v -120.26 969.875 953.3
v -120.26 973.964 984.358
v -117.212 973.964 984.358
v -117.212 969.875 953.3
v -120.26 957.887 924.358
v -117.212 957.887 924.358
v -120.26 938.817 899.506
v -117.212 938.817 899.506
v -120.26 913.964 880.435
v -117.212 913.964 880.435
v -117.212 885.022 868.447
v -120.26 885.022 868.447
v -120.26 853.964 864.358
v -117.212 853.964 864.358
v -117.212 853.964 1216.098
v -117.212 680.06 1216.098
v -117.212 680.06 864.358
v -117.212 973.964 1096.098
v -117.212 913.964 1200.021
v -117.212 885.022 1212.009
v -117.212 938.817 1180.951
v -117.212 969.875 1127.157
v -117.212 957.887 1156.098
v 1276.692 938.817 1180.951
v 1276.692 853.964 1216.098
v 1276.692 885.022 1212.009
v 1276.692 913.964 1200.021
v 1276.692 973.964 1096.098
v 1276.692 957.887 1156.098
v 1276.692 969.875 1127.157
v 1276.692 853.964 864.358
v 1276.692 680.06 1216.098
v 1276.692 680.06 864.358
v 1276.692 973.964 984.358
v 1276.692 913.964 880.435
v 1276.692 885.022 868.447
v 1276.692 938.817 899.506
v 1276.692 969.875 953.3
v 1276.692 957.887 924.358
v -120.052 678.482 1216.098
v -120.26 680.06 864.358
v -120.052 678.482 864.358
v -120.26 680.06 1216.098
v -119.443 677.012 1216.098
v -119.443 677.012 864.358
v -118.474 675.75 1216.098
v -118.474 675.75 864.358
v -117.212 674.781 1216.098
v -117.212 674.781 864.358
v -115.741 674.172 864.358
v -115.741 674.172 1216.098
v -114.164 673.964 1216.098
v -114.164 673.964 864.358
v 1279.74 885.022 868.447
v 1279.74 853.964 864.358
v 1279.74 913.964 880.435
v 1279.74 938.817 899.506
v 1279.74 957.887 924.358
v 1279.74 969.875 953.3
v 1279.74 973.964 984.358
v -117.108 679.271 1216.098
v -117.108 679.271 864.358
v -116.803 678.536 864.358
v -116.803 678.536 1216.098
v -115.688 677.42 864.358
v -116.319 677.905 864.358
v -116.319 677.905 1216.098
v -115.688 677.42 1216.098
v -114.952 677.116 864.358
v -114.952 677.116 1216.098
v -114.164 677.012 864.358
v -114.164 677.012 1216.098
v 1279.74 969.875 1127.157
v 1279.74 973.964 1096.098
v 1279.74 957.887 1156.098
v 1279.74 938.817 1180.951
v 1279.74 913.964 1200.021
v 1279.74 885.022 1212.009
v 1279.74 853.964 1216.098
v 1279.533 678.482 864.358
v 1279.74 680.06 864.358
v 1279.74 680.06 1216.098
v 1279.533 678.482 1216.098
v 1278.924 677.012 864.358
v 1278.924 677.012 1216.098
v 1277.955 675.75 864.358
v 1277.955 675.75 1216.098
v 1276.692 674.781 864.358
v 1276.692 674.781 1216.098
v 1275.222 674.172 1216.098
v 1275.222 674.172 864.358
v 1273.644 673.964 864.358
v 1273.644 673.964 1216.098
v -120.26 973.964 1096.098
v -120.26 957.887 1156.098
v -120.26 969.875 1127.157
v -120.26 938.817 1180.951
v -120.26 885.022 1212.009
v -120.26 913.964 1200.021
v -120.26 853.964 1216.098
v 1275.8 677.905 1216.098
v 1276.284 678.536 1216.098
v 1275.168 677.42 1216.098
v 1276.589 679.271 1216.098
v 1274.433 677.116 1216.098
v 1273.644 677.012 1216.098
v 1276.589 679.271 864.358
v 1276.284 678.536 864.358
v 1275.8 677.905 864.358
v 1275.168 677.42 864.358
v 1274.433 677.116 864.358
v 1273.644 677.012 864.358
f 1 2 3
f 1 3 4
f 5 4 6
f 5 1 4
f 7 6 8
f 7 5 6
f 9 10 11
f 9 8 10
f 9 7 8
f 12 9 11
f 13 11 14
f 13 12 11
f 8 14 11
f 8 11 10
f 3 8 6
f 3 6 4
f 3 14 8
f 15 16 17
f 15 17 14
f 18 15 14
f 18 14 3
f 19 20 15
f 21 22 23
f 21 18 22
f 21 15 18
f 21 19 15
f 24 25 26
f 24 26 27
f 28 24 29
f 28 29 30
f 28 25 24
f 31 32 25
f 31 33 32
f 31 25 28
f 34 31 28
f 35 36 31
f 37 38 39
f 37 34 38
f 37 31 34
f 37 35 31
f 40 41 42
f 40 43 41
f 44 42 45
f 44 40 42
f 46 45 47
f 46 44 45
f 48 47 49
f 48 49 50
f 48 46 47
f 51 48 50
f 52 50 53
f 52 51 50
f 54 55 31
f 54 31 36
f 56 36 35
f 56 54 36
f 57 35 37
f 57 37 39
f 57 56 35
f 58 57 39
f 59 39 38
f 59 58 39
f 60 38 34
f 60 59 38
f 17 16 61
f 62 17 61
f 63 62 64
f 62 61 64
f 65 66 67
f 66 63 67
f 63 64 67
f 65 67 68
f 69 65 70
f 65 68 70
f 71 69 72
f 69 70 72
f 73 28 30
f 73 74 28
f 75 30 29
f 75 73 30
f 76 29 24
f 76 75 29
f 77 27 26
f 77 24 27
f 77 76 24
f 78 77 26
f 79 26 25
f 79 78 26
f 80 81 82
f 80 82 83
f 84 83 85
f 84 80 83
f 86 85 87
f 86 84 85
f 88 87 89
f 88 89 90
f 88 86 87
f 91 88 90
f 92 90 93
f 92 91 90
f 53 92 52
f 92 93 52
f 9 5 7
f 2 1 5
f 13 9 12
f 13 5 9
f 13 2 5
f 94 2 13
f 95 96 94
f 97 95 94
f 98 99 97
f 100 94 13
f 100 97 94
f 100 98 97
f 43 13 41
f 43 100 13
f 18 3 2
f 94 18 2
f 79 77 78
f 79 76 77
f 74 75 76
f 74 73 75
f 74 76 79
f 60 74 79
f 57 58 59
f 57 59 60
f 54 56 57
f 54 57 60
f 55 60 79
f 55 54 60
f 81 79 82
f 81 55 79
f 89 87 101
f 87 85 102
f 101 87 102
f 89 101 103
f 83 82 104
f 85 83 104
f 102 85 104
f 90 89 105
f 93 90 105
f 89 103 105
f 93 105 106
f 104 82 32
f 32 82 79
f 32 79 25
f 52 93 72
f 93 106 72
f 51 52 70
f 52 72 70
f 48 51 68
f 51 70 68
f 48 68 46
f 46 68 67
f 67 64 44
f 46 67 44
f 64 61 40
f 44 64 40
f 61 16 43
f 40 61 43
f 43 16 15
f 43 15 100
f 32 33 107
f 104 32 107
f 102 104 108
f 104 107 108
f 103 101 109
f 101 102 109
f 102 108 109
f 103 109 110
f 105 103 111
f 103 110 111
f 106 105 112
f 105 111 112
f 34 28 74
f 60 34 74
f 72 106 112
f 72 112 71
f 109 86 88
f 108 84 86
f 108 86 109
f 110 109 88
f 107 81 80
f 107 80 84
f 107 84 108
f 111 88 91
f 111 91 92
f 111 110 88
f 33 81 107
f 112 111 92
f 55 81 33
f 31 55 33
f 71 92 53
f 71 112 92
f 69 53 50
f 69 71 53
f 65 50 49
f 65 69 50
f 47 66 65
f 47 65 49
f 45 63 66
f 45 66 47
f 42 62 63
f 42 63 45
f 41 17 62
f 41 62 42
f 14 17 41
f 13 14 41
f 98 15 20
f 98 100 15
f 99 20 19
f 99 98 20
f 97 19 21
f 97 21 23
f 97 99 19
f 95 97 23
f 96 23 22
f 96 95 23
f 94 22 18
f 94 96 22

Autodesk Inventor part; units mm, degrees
ref_plane "YZ Plane" through (0, 0, 0) normal (1, 0, 0) x (0, 1, 0)
ref_plane "XZ Plane" through (0, 0, 0) normal (0, 1, 0) x (-1, 0, 0)
ref_plane "XY Plane" through (0, 0, 0) normal (0, 0, 1) x (1, 0, 0)
ref_plane "Work Plane1" through (-420.2595, 673.9641, 1040.2284) normal (0, 1, 0) x (-1, 0, 0)
sketch "Sketch1" plane through (-420.2595, 673.9641, 1040.2284) normal (0, 1, 0) x (-1, 0, 0)
  line L0 (-1974.87, 175.87) -> (-25.13, 175.87) construction
  line L1 (-25.13, -175.87) -> (-1974.87, -175.87) construction
  line L2 (-24.13, 0) -> (-24.13, 224.13) construction
  line L3 (-1975.87, -224.13) -> (-1975.87, 0) construction
  line L4 (-1975.87, 0) -> (-1975.87, 224.13) construction
  line L5 (-24.13, -224.13) -> (-24.13, 0) construction
  line L6 (-300, 175.87) -> (-1700, 175.87)
  line L7 (-1700, 175.87) -> (-1700, -175.87)
  line L8 (-1700, -175.87) -> (-300, -175.87)
  line L9 (-300, -175.87) -> (-300, 175.87)
  point P0 (-420.2595, -1040.2284)
  point P1 (-1000, 175.87)
  point P2 (-1000, -175.87)
  point P3 (-1000, -175.87)
  dimension "d0" = 1400
extrude "Plate1" add sketch "Sketch1" along normal blind 3.048
sketch "Sketch2" plane through (1276.6925, 673.9641, 864.3584) normal (1, 0, 0) x (0, 1, 0)
  line L0 (0, 351.74) -> (0, 0)
  line L1 (0, 0) -> (300, 0)
  line L2 (300, 0) -> (300, 351.74)
  line L3 (300, 351.74) -> (0, 351.74)
edge flange "Flange1" height 300 angle 90 thickness 3.048 bend radius 3.048 thickness toward (1, 0, 0) relief tear relief width 3.048 relief depth 1.524 corner gap 3.048 corner form 0 edges at (1279.7405, 677.0121, 1040.2284) (-120.2595, 677.0121, 1040.2284) wall of the first edge with corners at (1276.6925, 673.9641, 1216.0984) (1276.6925, 673.9641, 864.3584) (1276.6925, 973.9641, 864.3584) (1276.6925, 973.9641, 1216.0984)
bend "Bend1"
corner "Corner1"
fillet "Corner Round1" radius 120 4 edges at (-118.7355, 973.9641, 1216.0984) (-118.7355, 973.9641, 864.3584) (1278.2165, 973.9641, 1216.0984) (1278.2165, 973.9641, 864.3584)
equation "\"d1\" = Thickness"
equation "\"d2\" = BendReliefWidth"
equation "\"d3\" = BendReliefDepth"
equation "\"d4\" = MinimumRemnant"
equation "\"d5\" = TransitionRadius"
equation "\"d8\" = BendRadius"
equation "\"d9\" = CornerReliefSize"
equation "\"d10\" = GapSize"
equation "\"d11\" = JacobiRadiusSize"
equation "\"BendRadius\" = Thickness"
equation "\"BendReliefWidth\" = Thickness"
equation "\"BendReliefDepth\" = 0.5 * Thickness"
equation "\"CornerReliefSize\" = 4 * Thickness"
equation "\"MinimumRemnant\" = 2 * Thickness"
equation "\"TransitionRadius\" = BendRadius"
equation "\"JacobiRadiusSize\" = BendRadius"
equation "\"GapSize\" = Thickness"
equation "\"Thickness\" = 3.048"
properties part number "CE-5.2.3-03"
